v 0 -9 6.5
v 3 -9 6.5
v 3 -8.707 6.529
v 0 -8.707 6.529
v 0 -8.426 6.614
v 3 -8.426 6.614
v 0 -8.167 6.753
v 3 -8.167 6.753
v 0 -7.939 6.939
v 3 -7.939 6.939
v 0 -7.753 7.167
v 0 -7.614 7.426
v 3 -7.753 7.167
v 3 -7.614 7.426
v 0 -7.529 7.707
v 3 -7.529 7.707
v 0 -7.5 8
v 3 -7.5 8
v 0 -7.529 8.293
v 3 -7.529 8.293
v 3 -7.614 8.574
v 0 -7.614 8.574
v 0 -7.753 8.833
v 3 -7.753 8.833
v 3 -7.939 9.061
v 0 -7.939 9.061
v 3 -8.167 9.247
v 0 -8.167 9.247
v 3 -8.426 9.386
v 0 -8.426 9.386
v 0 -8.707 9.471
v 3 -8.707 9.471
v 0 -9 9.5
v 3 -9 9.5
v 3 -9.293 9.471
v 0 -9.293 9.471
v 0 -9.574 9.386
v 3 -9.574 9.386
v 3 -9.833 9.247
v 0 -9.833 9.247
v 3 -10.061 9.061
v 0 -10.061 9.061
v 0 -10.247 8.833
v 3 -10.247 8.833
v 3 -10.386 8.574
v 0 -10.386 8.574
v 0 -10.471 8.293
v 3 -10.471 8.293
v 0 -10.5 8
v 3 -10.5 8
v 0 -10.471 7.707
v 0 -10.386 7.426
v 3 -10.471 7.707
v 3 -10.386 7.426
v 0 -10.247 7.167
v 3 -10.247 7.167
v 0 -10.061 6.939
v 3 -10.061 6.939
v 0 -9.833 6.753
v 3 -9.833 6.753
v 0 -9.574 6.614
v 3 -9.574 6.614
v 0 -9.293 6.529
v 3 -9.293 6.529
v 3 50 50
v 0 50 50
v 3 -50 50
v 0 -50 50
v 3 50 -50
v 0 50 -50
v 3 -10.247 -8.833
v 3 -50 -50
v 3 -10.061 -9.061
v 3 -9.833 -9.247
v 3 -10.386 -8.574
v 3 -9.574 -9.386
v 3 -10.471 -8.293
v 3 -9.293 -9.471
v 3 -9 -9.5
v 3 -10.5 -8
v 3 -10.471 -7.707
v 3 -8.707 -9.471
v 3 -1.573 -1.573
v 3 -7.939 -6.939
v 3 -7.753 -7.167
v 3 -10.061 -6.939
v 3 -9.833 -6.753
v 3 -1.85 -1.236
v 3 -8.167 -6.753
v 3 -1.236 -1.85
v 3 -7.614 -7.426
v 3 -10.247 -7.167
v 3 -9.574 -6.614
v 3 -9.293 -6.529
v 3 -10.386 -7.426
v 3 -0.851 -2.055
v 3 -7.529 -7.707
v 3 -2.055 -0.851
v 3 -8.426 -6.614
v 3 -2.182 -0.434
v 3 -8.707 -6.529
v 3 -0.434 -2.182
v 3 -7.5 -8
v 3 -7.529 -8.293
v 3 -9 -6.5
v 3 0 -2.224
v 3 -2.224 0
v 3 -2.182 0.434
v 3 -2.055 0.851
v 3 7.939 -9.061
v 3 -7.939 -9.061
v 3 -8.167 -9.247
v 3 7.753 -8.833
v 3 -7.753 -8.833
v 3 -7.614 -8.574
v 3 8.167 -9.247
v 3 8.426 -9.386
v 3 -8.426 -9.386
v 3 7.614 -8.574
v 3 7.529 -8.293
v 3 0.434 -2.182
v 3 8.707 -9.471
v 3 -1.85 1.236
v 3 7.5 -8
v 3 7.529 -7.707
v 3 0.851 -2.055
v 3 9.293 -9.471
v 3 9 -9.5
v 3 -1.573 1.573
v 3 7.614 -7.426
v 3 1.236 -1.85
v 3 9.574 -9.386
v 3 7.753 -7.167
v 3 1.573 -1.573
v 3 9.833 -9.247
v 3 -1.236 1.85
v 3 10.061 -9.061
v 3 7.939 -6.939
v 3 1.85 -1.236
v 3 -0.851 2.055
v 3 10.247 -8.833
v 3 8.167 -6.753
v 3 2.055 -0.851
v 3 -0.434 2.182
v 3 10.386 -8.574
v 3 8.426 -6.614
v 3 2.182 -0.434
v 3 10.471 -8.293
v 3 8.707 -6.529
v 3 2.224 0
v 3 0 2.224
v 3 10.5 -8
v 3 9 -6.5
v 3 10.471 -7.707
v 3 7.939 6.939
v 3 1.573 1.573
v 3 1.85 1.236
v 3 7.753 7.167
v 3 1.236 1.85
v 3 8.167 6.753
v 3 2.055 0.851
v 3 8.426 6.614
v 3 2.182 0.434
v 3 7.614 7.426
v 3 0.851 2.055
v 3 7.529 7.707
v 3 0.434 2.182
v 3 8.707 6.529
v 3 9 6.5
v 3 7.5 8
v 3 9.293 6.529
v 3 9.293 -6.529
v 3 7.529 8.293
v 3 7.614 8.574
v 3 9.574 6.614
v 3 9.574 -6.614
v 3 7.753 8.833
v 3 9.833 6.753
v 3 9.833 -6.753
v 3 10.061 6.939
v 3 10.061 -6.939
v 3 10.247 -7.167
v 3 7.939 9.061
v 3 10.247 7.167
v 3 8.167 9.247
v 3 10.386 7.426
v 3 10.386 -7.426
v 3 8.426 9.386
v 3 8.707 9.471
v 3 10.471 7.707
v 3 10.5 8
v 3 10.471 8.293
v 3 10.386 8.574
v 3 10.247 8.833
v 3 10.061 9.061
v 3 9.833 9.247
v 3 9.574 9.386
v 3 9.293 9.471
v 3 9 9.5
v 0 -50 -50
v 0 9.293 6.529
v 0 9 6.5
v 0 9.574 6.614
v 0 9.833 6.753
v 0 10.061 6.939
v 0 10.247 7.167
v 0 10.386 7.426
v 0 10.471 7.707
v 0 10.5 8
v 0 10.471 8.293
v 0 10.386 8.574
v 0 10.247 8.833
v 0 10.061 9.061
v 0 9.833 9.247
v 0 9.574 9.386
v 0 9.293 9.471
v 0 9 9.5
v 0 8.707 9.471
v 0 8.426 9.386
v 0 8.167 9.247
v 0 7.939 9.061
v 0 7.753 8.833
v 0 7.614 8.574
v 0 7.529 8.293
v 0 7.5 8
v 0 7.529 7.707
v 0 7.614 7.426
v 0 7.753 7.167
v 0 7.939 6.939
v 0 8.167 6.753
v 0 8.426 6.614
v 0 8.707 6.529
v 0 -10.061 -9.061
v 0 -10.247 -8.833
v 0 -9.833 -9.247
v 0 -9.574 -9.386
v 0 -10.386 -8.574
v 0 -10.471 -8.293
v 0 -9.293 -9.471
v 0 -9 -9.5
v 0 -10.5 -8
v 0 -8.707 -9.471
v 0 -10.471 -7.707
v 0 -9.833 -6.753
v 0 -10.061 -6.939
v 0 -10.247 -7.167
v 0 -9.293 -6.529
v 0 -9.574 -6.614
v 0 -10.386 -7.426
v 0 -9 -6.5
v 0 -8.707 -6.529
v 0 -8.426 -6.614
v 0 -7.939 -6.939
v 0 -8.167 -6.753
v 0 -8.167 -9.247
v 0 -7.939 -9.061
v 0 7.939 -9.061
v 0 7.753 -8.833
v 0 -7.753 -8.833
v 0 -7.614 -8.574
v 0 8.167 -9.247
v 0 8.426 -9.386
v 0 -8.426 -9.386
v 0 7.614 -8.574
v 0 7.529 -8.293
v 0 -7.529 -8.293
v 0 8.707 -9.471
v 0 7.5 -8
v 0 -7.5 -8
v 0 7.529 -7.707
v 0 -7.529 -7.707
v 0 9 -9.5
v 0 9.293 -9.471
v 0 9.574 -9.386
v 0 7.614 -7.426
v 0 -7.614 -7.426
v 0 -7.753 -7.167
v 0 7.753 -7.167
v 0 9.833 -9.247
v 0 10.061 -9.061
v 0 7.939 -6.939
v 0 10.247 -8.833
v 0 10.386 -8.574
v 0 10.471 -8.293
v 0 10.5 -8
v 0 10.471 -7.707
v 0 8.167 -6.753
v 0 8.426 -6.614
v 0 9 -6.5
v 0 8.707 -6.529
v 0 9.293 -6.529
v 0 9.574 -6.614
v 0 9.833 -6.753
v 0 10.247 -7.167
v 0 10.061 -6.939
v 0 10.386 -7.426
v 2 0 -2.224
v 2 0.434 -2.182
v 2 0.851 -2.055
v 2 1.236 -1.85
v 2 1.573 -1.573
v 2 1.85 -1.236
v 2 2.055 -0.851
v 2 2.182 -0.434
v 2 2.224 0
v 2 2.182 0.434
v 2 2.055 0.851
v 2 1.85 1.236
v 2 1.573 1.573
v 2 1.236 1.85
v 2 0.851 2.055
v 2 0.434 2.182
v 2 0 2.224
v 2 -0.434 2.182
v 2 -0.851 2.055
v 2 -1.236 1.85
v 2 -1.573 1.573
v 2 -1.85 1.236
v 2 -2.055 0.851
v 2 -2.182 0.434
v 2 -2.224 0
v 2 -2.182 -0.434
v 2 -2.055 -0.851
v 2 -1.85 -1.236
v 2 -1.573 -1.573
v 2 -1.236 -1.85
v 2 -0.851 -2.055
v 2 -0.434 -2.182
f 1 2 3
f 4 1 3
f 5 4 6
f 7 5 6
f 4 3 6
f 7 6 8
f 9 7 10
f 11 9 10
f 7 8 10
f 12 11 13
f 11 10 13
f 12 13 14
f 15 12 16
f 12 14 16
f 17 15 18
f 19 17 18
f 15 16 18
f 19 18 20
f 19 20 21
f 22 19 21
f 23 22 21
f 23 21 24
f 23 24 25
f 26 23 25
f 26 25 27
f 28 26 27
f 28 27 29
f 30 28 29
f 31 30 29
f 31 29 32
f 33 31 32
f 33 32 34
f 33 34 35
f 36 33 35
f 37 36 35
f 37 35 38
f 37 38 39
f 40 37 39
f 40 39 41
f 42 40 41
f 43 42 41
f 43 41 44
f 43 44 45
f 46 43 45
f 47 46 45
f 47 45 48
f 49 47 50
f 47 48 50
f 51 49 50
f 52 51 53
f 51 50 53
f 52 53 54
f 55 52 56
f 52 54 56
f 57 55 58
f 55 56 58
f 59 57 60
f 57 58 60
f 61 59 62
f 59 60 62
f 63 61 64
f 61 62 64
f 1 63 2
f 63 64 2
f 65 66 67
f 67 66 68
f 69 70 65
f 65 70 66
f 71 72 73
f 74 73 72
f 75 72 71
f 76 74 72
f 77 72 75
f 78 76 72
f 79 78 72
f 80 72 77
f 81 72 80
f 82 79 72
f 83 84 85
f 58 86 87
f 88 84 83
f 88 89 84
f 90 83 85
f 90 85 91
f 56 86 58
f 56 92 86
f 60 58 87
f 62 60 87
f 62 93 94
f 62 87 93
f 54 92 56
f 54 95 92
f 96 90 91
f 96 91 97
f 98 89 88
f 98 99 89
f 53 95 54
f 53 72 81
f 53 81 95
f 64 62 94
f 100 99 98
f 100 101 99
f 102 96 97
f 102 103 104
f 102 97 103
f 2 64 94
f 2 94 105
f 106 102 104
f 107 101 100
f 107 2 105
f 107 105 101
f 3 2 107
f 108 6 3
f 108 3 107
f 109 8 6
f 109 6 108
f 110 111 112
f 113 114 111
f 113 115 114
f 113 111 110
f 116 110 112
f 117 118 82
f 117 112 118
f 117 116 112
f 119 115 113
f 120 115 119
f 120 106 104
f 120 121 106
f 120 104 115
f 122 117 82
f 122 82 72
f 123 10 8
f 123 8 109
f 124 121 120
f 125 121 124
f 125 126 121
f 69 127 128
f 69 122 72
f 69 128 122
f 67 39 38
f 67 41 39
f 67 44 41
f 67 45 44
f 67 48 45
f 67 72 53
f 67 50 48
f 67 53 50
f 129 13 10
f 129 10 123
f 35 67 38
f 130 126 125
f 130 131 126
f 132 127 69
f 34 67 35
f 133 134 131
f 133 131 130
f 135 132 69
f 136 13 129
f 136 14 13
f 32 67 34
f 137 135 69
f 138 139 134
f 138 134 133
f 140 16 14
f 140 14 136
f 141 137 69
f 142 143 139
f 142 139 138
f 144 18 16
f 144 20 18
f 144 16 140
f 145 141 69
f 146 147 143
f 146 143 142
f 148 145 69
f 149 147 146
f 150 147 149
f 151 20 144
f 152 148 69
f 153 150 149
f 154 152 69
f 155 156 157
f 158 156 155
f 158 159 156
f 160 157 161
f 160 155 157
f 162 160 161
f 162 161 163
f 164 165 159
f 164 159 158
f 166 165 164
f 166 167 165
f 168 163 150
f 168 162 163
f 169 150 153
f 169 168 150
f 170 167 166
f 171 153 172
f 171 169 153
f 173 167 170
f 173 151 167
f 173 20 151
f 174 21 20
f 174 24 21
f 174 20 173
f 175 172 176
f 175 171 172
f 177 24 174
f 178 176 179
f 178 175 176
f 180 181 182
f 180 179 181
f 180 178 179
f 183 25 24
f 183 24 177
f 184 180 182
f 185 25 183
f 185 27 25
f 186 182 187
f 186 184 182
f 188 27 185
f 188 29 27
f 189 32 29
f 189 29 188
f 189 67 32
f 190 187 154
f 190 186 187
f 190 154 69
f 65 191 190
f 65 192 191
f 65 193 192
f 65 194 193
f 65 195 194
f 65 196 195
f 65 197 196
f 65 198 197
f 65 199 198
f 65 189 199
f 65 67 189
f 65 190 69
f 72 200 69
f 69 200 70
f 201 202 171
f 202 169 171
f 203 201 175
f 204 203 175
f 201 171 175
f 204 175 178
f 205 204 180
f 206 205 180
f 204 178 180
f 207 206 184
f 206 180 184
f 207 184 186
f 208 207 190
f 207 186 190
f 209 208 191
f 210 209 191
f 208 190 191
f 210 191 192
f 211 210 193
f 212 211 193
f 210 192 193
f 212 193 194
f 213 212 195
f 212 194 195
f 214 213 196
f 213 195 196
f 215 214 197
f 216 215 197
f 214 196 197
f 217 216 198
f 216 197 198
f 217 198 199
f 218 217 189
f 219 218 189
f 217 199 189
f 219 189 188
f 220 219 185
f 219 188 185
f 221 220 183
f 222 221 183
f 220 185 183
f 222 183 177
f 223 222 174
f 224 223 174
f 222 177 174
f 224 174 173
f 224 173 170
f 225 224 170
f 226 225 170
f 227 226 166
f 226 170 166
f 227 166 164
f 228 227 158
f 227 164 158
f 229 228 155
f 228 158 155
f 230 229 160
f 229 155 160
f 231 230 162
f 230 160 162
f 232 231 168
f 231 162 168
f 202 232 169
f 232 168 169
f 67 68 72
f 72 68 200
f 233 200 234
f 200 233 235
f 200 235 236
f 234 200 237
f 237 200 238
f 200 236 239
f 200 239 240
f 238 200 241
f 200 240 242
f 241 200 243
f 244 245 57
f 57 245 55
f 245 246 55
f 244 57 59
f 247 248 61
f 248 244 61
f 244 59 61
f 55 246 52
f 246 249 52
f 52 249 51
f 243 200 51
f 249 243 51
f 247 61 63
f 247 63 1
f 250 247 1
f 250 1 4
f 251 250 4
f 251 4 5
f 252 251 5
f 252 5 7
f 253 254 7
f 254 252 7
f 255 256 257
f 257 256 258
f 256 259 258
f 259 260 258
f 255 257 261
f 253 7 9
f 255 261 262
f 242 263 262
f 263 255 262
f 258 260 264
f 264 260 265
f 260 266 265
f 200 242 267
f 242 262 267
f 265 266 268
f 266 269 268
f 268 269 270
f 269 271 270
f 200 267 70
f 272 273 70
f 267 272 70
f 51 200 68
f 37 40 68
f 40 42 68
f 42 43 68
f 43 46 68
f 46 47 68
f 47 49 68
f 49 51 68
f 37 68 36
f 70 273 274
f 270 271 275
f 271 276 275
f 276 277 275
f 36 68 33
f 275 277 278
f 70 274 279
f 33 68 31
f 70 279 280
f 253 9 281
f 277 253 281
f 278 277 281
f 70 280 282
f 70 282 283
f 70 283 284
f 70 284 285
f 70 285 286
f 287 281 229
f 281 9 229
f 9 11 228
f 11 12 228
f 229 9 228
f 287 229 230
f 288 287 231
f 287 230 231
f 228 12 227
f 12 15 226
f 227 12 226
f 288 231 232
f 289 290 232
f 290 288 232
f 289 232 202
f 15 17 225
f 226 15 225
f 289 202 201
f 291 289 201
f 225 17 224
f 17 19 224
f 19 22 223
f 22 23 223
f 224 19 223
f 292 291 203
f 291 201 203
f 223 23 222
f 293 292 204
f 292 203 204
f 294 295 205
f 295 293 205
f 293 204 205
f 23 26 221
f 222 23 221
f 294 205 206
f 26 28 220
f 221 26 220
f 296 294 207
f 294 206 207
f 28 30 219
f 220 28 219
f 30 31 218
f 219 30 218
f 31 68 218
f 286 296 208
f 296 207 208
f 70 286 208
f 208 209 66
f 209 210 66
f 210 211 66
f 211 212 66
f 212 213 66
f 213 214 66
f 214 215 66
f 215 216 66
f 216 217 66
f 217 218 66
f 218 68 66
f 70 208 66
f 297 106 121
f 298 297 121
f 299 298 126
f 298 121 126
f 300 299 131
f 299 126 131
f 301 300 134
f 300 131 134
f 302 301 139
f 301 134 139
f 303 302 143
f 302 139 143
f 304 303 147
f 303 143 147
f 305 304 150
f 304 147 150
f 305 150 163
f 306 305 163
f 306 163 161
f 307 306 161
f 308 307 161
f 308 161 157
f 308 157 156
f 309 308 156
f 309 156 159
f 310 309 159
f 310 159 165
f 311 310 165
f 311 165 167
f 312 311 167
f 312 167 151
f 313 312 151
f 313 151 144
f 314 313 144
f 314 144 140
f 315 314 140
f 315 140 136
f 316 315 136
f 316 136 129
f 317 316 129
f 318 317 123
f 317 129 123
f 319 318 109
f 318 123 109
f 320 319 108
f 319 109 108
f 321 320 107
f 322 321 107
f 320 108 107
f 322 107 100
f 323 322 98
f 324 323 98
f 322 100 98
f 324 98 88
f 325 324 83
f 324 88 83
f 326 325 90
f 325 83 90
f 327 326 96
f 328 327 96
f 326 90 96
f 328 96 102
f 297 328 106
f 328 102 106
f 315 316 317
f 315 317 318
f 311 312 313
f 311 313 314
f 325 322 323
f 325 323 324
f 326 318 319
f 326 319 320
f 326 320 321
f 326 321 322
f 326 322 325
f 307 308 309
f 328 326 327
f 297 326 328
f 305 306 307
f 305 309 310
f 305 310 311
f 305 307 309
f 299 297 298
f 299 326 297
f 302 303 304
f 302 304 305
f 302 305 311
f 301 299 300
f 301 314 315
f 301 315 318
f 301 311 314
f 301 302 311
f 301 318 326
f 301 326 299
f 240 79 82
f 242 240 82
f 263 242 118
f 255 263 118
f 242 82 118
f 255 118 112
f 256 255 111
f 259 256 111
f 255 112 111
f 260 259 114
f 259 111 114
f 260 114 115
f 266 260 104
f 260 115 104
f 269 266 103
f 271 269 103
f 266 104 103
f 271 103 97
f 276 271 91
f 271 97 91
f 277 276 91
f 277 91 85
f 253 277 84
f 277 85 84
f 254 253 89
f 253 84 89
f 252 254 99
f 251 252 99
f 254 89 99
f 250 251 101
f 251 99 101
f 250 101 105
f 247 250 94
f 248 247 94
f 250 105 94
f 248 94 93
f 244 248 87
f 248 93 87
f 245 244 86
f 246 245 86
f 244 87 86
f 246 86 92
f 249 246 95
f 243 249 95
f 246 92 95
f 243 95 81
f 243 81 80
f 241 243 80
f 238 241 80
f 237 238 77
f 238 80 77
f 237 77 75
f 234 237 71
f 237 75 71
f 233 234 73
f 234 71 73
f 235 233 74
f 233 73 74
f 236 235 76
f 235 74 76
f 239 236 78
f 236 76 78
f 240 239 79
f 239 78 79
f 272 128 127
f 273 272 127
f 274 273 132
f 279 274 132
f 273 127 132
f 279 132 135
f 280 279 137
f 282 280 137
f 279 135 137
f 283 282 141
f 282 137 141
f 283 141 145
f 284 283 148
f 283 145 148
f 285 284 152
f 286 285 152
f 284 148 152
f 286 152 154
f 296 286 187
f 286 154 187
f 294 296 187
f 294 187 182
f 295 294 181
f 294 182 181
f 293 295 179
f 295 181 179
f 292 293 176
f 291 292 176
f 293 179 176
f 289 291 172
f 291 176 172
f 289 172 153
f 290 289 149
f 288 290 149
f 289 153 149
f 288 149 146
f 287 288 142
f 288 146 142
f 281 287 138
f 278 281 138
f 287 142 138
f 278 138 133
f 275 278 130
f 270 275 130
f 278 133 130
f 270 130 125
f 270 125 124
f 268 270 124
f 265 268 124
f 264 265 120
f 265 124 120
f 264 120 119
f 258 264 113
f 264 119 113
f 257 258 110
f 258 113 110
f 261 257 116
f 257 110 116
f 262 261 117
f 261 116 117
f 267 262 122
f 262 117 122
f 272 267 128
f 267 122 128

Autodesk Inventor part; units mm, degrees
ref_plane "YZ Plane" through (0, 0, 0) normal (1, 0, 0) x (0, 1, 0)
ref_plane "XZ Plane" through (0, 0, 0) normal (0, 1, 0) x (-1, 0, 0)
ref_plane "XY Plane" through (0, 0, 0) normal (0, 0, 1) x (1, 0, 0)
sketch "Sketch1" plane through (0, 0, 0) normal (1, 0, 0) x (0, 1, 0)
  line L0 (50, 50) -> (-50, 50)
  line L1 (-50, 50) -> (-50, -50)
  line L2 (-50, -50) -> (50, -50)
  line L3 (50, -50) -> (50, 50)
  line L4 (50, 50) -> (-50, -50) construction
  line L5 (-50, 50) -> (50, -50) construction
  point P0 (0, 0)
  dimension "d0" = 100
  dimension "d1" = 100
extrude "Extrusion1" add sketch "Sketch1" along normal blind 3
sketch "Sketch2" plane through (3, 0, 0) normal (1, 0, 0) x (0, 0, -1)
  circle A0 centre (-8, -9) radius 1.5
  circle A1 centre (8, -9) radius 1.5
  circle A2 centre (8, 9) radius 1.5
  circle A3 centre (-8, 9) radius 1.5
  ellipse E0 centre (0, 0) end of major axis (13, 14) minor radius 3.6924 (4.9841, 0.0284) -> (0.0262, 5.3386) ccw
  ellipse E1 centre (0, 0) end of major axis (-13, 14) minor radius 3.7302 (0.0262, 5.3386) -> (-4.9841, -0.0284) ccw
  ellipse E2 centre (0, 0) end of major axis (13, 14) minor radius 3.6924 (-4.9841, -0.0284) -> (-0.0262, -5.3386) ccw
  ellipse E3 centre (0, 0) end of major axis (-13, 14) minor radius 3.7302 (-0.0262, -5.3386) -> (4.9841, 0.0284) ccw
  point P0 (0, 9.3923)
extrude "Extrusion2" cut sketch "Sketch2" against normal blind 3 contours A0 | A1 | A2 | A3
sketch "Sketch3" plane through (3, 0, 0) normal (1, 0, 0) x (0, 0, -1)
  circle A0 centre (0, 0) radius 2.2245
extrude "Extrusion3" cut sketch "Sketch3" against normal blind 1
properties part number "marker plate"
